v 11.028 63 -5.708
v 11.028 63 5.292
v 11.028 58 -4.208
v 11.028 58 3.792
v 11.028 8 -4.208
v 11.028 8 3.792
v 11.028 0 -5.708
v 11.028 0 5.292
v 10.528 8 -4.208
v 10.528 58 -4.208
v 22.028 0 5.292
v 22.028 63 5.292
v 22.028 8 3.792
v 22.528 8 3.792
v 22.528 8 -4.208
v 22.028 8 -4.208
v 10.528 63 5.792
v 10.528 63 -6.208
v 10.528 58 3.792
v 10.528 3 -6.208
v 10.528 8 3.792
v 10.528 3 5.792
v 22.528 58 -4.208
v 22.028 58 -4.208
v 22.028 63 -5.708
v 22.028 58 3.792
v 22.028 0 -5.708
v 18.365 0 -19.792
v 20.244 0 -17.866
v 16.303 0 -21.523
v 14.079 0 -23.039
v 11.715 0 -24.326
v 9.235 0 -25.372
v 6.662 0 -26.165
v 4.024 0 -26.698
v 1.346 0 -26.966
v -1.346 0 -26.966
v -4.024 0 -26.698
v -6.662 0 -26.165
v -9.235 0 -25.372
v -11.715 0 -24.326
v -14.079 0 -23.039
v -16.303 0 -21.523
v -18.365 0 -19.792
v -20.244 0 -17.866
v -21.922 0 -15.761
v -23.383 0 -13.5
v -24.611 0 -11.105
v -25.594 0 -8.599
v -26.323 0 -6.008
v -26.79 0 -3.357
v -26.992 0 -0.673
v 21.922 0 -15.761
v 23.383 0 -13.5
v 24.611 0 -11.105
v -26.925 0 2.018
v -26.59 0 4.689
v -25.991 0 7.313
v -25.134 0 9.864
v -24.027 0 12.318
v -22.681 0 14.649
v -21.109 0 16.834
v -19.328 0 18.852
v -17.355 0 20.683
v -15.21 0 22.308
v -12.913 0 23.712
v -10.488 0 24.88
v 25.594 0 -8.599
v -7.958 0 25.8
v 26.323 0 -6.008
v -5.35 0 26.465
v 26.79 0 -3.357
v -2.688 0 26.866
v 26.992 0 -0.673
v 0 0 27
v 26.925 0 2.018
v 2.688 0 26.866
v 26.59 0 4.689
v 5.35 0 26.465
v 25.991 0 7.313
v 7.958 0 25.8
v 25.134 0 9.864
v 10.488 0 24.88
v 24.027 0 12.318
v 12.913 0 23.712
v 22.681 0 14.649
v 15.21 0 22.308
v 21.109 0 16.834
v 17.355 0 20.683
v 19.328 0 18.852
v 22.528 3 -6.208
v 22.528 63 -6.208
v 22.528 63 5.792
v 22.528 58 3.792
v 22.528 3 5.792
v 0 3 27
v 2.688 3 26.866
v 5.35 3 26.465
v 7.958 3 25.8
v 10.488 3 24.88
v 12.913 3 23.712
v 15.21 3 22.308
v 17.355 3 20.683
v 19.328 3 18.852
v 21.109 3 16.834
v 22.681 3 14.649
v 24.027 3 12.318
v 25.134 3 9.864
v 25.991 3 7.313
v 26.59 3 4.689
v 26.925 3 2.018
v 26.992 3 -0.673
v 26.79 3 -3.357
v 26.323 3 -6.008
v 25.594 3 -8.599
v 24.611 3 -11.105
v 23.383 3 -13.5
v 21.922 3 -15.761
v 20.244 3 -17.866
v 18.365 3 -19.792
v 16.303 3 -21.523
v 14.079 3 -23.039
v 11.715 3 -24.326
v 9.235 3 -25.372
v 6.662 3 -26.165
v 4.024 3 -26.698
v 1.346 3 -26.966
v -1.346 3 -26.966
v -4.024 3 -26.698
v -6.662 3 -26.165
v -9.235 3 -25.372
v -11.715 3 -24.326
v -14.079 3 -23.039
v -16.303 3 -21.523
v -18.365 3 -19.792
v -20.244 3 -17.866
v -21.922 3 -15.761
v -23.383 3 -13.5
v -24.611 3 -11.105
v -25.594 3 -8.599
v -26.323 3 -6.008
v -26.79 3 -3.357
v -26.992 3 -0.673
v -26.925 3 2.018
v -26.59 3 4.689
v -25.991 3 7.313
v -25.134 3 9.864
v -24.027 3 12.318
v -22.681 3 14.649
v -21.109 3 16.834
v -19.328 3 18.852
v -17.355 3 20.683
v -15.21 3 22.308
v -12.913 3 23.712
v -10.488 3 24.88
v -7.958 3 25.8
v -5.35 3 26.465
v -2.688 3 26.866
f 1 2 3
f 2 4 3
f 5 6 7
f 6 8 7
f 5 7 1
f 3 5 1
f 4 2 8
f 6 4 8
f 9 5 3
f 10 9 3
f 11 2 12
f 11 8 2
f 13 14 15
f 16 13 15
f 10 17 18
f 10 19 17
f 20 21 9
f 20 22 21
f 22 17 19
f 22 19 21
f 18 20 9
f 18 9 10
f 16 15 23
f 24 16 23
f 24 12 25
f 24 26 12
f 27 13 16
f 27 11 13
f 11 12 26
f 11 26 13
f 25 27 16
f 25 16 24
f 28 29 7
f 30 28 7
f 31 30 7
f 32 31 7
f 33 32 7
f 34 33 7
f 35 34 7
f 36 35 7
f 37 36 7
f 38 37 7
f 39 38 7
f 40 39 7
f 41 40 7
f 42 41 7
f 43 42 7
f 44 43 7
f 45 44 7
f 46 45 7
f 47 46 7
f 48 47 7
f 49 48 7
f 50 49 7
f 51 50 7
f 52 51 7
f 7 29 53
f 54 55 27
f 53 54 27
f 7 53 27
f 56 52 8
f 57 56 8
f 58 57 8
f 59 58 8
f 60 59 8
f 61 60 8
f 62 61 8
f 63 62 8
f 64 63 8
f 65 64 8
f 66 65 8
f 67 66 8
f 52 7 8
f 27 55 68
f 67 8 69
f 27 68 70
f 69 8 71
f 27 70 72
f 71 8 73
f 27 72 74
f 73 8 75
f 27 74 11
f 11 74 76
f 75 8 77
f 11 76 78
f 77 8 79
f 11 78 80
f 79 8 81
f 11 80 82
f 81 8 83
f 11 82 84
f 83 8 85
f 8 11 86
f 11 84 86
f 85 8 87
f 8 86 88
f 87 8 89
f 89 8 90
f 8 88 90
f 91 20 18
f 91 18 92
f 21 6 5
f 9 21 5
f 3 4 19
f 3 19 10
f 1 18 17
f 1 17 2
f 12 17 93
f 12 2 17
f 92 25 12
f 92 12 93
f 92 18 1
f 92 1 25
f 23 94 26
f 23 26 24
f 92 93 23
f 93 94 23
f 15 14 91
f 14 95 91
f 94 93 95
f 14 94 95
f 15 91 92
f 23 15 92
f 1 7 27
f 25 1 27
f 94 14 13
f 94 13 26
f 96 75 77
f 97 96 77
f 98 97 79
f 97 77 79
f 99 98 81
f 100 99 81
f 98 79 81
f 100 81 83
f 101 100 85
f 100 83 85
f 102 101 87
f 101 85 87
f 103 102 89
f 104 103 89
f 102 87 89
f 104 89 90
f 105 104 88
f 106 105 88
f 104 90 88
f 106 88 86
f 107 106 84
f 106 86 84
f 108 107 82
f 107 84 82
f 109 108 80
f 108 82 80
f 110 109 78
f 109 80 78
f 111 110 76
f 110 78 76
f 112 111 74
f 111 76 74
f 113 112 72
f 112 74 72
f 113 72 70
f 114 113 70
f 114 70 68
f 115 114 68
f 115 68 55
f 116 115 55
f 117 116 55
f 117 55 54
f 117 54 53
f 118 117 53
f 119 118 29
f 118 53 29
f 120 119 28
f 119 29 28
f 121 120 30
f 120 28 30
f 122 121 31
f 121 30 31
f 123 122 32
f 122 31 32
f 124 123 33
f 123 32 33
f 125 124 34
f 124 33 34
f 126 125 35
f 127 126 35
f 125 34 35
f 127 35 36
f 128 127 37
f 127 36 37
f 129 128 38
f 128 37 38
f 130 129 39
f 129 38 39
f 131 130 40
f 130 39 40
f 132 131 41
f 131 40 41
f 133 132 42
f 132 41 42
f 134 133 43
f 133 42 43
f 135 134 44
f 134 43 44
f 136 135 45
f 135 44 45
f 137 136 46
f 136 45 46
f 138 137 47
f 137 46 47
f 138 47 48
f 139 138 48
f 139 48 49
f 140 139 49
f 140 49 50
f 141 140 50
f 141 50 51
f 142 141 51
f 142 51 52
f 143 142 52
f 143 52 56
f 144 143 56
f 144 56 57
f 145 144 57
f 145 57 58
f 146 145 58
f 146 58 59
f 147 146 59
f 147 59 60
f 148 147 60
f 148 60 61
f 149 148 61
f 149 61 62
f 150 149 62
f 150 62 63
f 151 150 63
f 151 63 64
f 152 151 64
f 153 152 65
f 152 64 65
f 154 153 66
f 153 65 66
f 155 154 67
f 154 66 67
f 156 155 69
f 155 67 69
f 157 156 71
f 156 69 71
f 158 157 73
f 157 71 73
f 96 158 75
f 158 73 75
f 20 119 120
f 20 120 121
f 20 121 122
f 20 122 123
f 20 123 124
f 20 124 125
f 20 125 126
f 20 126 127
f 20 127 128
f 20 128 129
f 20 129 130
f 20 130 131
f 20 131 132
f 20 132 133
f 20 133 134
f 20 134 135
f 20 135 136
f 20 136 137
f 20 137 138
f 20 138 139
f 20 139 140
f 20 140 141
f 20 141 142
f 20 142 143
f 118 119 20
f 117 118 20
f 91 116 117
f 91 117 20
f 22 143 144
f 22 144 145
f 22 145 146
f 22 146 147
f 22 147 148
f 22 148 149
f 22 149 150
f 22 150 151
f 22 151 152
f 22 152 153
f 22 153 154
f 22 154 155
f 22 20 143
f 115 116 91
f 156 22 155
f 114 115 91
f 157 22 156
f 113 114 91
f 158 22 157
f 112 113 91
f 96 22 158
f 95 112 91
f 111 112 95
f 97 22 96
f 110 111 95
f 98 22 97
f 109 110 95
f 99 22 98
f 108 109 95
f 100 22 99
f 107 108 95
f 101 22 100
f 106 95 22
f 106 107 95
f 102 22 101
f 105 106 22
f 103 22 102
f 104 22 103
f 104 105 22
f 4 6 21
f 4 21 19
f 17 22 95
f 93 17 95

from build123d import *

# Parameters (mm, degrees)
SKETCH1_R           = 27
BOSS_EXTRUDE2_DEPTH = 3
SKETCH3_W           = 11
SKETCH3_H           = 11
CUT_EXTRUDE1_DEPTH  = 3
SKETCH5_W           = 12
SKETCH5_H           = 12
SKETCH5_W_2         = 11
SKETCH5_H_2         = 11
BOSS_EXTRUDE3_DEPTH = 60
SKETCH6_W           = 8
SKETCH6_H           = 50
CUT_EXTRUDE2_DEPTH  = 60


with BuildPart() as part:
    # Sketch1 → Boss-Extrude2 (new body)
    with BuildSketch(Plane(origin=(0, 0, 0), x_dir=(1, 0, 0), z_dir=(0, 1, 0))):
        with Locations(Location((0, 0, 0), (0, 0, 270))):
            Circle(SKETCH1_R)
    extrude(amount=BOSS_EXTRUDE2_DEPTH)

    # Sketch3 → Cut-Extrude1 (cut)
    with BuildSketch(Plane(origin=(0, 3, 0), x_dir=(1, 0, 0), z_dir=(0, 1, 0))):
        with Locations((16.527901815, 0.208370768)):
            Rectangle(SKETCH3_W, SKETCH3_H)
    extrude(amount=-CUT_EXTRUDE1_DEPTH, mode=Mode.SUBTRACT)

    # Sketch5 → Boss-Extrude3 (add)
    with BuildSketch(Plane(origin=(0, 3, 0), x_dir=(1, 0, 0), z_dir=(0, 1, 0))):
        with Locations((16.527901815, 0.208370768)):
            Rectangle(SKETCH5_W, SKETCH5_H)
        with Locations((16.527901815, 0.208370768)):
            Rectangle(SKETCH5_W_2, SKETCH5_H_2, mode=Mode.SUBTRACT)
    extrude(amount=BOSS_EXTRUDE3_DEPTH)

    # Sketch6 → Cut-Extrude2 (cut)
    with BuildSketch(Plane(origin=(22.527901815, 0, 0), x_dir=(0, 0, -1), z_dir=(1, 0, 0))):
        with Locations((0.208370768, 33)):
            Rectangle(SKETCH6_W, SKETCH6_H)
    extrude(amount=-CUT_EXTRUDE2_DEPTH, mode=Mode.SUBTRACT)


solid = part.part
